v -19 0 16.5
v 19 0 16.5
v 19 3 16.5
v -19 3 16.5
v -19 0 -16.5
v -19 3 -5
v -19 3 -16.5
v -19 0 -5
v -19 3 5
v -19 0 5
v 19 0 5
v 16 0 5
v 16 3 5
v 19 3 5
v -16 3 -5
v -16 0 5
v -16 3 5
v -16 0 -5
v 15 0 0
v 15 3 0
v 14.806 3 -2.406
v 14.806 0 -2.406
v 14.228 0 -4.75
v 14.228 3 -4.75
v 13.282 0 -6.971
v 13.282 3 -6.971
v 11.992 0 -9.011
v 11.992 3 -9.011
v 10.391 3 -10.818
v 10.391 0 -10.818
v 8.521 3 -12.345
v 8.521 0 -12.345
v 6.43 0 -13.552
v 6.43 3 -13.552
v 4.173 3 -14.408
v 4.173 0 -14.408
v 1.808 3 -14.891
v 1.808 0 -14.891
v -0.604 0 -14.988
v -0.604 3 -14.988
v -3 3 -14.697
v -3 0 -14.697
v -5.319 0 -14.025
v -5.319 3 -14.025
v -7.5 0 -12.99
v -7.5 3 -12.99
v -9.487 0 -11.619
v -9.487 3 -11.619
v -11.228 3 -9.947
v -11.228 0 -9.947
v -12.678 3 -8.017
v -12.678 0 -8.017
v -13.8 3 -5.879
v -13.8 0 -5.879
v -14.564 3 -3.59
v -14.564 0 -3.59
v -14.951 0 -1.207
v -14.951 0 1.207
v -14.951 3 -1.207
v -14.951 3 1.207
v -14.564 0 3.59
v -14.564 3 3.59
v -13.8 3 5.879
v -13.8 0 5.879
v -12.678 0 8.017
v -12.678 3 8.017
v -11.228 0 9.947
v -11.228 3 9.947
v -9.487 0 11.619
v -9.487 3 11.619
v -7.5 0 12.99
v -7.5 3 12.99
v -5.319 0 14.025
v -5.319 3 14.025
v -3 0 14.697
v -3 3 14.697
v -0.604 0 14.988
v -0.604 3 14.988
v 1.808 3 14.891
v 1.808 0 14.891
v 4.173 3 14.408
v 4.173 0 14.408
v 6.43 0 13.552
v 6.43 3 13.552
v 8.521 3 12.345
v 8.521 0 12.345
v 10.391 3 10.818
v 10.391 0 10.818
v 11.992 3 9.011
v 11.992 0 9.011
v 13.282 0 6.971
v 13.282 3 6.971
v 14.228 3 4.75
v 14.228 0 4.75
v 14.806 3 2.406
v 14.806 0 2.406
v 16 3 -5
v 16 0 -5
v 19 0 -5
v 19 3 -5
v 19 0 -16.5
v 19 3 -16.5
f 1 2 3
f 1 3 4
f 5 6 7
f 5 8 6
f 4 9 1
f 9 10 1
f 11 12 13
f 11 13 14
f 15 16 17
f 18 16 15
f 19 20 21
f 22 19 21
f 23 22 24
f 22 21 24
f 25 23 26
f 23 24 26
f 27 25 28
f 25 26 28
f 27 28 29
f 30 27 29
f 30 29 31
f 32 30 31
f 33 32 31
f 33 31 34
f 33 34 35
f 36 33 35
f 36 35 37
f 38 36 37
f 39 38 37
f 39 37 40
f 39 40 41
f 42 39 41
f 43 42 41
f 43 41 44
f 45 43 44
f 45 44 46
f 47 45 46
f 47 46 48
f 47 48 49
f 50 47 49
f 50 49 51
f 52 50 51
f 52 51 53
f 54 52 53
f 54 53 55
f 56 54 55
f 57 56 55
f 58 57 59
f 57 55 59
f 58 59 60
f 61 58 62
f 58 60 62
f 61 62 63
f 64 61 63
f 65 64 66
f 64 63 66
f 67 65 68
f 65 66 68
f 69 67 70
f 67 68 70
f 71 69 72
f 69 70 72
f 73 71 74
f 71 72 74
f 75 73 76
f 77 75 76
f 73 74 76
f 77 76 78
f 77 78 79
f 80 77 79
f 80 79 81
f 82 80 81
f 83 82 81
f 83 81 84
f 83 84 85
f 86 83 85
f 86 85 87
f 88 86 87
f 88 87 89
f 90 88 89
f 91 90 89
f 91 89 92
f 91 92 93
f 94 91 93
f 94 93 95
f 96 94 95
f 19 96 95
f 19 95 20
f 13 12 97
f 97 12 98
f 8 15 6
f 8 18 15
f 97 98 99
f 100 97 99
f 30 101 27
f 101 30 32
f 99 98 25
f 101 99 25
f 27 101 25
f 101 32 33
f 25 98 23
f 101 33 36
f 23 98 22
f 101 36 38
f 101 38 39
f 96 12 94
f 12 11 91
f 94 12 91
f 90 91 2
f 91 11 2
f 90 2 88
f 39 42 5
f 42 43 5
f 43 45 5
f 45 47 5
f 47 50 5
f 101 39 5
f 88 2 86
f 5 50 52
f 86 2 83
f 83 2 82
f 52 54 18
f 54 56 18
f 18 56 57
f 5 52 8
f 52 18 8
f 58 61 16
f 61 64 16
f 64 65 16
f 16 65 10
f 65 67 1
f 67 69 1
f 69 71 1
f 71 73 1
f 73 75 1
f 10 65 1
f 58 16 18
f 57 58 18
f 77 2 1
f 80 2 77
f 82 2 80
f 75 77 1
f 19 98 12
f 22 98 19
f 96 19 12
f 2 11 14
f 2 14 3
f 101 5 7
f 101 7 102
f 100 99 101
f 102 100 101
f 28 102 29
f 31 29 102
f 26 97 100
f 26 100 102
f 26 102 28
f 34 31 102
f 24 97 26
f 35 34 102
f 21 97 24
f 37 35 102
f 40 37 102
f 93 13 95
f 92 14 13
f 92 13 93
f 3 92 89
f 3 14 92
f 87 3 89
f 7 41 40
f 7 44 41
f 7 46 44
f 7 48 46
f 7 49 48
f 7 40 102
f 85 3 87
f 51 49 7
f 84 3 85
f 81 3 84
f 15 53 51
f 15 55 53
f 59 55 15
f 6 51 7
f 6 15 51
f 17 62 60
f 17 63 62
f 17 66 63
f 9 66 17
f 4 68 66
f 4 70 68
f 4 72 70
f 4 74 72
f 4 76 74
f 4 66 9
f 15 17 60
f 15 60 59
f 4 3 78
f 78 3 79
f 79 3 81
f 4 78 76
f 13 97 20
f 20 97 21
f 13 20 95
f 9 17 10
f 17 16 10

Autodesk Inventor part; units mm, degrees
ref_plane "YZ Plane" through (0, 0, 0) normal (1, 0, 0) x (0, 1, 0)
ref_plane "XZ Plane" through (0, 0, 0) normal (0, 1, 0) x (-1, 0, 0)
ref_plane "XY Plane" through (0, 0, 0) normal (0, 0, 1) x (1, 0, 0)
sketch "Sketch1" plane through (0, 0, 0) normal (0, 1, 0) x (-1, 0, 0)
  line L0 (0, 0) -> (19, 0) construction
  line L1 (19, -5) -> (19, -15.5)
  line L2 (19, 0) -> (16, 0) construction
  line L3 (16, 0) -> (16, -5)
  line L4 (16, -5) -> (19, -5)
  circle A0 centre (0, 0) radius 14.5
  line L5 (19, -15.5) -> (0, -15.5)
  line L6 (0, 0) -> (0, 19.3776) construction
  line L7 (19, 5) -> (19, 15.5)
  line L8 (16, 0) -> (16, 5)
  line L9 (16, 5) -> (19, 5)
  line L10 (19, 15.5) -> (0, 15.5)
  line L11 (0, 0) -> (0, -19.3776) construction
  line L12 (-19, -5) -> (-19, -15.5)
  line L13 (-16, 0) -> (-16, -5)
  line L14 (-16, -5) -> (-19, -5)
  line L15 (-19, -15.5) -> (0, -15.5)
  line L16 (-16, 0) -> (-16, 5)
  line L17 (-16, 5) -> (-19, 5)
  line L18 (-19, 5) -> (-19, 15.5)
  line L19 (-19, 15.5) -> (0, 15.5)
  dimension "d1" = 19
  dimension "d2" = 15.5
  dimension "d5" = 5
extrude "Extrusion1" add sketch "Sketch1" along normal blind 3 contours L1 L5 L15 L12 L14 L13 L16 L17 L18 L19 L10 L7 L9 L8 L3 L4 | A0
sketch "Sketch4" plane through (0, 3, 0) normal (0, 1, 0) x (1, 0, 0)
  circle A0 centre (0, 0) radius 15
  dimension "d14" = 30
extrude "Extrusion4" cut sketch "Sketch4" against normal up to surface (3 mm away)
sketch "Sketch5" plane through (0, 0, 0) normal (0, -1, 0) x (1, 0, 0)
  line L0 (19, -15.5) -> (-19, -15.5) projected
  line L1 (-19, -15.5) -> (-19, -16.5)
  line L2 (-19, -16.5) -> (19, -16.5)
  line L3 (19, -16.5) -> (19, -15.5)
  line L4 (-19, 15.5) -> (19, 15.5) projected
  line L5 (19, 15.5) -> (19, 16.5)
  line L6 (19, 16.5) -> (-19, 16.5)
  line L7 (-19, 16.5) -> (-19, 15.5)
  point P0 (0, 0)
  dimension "d17" = 1
  dimension "d18" = 1
extrude "Extrusion5" add sketch "Sketch5" against normal up to surface (3 mm away)
properties part number "SoporteSensor"
